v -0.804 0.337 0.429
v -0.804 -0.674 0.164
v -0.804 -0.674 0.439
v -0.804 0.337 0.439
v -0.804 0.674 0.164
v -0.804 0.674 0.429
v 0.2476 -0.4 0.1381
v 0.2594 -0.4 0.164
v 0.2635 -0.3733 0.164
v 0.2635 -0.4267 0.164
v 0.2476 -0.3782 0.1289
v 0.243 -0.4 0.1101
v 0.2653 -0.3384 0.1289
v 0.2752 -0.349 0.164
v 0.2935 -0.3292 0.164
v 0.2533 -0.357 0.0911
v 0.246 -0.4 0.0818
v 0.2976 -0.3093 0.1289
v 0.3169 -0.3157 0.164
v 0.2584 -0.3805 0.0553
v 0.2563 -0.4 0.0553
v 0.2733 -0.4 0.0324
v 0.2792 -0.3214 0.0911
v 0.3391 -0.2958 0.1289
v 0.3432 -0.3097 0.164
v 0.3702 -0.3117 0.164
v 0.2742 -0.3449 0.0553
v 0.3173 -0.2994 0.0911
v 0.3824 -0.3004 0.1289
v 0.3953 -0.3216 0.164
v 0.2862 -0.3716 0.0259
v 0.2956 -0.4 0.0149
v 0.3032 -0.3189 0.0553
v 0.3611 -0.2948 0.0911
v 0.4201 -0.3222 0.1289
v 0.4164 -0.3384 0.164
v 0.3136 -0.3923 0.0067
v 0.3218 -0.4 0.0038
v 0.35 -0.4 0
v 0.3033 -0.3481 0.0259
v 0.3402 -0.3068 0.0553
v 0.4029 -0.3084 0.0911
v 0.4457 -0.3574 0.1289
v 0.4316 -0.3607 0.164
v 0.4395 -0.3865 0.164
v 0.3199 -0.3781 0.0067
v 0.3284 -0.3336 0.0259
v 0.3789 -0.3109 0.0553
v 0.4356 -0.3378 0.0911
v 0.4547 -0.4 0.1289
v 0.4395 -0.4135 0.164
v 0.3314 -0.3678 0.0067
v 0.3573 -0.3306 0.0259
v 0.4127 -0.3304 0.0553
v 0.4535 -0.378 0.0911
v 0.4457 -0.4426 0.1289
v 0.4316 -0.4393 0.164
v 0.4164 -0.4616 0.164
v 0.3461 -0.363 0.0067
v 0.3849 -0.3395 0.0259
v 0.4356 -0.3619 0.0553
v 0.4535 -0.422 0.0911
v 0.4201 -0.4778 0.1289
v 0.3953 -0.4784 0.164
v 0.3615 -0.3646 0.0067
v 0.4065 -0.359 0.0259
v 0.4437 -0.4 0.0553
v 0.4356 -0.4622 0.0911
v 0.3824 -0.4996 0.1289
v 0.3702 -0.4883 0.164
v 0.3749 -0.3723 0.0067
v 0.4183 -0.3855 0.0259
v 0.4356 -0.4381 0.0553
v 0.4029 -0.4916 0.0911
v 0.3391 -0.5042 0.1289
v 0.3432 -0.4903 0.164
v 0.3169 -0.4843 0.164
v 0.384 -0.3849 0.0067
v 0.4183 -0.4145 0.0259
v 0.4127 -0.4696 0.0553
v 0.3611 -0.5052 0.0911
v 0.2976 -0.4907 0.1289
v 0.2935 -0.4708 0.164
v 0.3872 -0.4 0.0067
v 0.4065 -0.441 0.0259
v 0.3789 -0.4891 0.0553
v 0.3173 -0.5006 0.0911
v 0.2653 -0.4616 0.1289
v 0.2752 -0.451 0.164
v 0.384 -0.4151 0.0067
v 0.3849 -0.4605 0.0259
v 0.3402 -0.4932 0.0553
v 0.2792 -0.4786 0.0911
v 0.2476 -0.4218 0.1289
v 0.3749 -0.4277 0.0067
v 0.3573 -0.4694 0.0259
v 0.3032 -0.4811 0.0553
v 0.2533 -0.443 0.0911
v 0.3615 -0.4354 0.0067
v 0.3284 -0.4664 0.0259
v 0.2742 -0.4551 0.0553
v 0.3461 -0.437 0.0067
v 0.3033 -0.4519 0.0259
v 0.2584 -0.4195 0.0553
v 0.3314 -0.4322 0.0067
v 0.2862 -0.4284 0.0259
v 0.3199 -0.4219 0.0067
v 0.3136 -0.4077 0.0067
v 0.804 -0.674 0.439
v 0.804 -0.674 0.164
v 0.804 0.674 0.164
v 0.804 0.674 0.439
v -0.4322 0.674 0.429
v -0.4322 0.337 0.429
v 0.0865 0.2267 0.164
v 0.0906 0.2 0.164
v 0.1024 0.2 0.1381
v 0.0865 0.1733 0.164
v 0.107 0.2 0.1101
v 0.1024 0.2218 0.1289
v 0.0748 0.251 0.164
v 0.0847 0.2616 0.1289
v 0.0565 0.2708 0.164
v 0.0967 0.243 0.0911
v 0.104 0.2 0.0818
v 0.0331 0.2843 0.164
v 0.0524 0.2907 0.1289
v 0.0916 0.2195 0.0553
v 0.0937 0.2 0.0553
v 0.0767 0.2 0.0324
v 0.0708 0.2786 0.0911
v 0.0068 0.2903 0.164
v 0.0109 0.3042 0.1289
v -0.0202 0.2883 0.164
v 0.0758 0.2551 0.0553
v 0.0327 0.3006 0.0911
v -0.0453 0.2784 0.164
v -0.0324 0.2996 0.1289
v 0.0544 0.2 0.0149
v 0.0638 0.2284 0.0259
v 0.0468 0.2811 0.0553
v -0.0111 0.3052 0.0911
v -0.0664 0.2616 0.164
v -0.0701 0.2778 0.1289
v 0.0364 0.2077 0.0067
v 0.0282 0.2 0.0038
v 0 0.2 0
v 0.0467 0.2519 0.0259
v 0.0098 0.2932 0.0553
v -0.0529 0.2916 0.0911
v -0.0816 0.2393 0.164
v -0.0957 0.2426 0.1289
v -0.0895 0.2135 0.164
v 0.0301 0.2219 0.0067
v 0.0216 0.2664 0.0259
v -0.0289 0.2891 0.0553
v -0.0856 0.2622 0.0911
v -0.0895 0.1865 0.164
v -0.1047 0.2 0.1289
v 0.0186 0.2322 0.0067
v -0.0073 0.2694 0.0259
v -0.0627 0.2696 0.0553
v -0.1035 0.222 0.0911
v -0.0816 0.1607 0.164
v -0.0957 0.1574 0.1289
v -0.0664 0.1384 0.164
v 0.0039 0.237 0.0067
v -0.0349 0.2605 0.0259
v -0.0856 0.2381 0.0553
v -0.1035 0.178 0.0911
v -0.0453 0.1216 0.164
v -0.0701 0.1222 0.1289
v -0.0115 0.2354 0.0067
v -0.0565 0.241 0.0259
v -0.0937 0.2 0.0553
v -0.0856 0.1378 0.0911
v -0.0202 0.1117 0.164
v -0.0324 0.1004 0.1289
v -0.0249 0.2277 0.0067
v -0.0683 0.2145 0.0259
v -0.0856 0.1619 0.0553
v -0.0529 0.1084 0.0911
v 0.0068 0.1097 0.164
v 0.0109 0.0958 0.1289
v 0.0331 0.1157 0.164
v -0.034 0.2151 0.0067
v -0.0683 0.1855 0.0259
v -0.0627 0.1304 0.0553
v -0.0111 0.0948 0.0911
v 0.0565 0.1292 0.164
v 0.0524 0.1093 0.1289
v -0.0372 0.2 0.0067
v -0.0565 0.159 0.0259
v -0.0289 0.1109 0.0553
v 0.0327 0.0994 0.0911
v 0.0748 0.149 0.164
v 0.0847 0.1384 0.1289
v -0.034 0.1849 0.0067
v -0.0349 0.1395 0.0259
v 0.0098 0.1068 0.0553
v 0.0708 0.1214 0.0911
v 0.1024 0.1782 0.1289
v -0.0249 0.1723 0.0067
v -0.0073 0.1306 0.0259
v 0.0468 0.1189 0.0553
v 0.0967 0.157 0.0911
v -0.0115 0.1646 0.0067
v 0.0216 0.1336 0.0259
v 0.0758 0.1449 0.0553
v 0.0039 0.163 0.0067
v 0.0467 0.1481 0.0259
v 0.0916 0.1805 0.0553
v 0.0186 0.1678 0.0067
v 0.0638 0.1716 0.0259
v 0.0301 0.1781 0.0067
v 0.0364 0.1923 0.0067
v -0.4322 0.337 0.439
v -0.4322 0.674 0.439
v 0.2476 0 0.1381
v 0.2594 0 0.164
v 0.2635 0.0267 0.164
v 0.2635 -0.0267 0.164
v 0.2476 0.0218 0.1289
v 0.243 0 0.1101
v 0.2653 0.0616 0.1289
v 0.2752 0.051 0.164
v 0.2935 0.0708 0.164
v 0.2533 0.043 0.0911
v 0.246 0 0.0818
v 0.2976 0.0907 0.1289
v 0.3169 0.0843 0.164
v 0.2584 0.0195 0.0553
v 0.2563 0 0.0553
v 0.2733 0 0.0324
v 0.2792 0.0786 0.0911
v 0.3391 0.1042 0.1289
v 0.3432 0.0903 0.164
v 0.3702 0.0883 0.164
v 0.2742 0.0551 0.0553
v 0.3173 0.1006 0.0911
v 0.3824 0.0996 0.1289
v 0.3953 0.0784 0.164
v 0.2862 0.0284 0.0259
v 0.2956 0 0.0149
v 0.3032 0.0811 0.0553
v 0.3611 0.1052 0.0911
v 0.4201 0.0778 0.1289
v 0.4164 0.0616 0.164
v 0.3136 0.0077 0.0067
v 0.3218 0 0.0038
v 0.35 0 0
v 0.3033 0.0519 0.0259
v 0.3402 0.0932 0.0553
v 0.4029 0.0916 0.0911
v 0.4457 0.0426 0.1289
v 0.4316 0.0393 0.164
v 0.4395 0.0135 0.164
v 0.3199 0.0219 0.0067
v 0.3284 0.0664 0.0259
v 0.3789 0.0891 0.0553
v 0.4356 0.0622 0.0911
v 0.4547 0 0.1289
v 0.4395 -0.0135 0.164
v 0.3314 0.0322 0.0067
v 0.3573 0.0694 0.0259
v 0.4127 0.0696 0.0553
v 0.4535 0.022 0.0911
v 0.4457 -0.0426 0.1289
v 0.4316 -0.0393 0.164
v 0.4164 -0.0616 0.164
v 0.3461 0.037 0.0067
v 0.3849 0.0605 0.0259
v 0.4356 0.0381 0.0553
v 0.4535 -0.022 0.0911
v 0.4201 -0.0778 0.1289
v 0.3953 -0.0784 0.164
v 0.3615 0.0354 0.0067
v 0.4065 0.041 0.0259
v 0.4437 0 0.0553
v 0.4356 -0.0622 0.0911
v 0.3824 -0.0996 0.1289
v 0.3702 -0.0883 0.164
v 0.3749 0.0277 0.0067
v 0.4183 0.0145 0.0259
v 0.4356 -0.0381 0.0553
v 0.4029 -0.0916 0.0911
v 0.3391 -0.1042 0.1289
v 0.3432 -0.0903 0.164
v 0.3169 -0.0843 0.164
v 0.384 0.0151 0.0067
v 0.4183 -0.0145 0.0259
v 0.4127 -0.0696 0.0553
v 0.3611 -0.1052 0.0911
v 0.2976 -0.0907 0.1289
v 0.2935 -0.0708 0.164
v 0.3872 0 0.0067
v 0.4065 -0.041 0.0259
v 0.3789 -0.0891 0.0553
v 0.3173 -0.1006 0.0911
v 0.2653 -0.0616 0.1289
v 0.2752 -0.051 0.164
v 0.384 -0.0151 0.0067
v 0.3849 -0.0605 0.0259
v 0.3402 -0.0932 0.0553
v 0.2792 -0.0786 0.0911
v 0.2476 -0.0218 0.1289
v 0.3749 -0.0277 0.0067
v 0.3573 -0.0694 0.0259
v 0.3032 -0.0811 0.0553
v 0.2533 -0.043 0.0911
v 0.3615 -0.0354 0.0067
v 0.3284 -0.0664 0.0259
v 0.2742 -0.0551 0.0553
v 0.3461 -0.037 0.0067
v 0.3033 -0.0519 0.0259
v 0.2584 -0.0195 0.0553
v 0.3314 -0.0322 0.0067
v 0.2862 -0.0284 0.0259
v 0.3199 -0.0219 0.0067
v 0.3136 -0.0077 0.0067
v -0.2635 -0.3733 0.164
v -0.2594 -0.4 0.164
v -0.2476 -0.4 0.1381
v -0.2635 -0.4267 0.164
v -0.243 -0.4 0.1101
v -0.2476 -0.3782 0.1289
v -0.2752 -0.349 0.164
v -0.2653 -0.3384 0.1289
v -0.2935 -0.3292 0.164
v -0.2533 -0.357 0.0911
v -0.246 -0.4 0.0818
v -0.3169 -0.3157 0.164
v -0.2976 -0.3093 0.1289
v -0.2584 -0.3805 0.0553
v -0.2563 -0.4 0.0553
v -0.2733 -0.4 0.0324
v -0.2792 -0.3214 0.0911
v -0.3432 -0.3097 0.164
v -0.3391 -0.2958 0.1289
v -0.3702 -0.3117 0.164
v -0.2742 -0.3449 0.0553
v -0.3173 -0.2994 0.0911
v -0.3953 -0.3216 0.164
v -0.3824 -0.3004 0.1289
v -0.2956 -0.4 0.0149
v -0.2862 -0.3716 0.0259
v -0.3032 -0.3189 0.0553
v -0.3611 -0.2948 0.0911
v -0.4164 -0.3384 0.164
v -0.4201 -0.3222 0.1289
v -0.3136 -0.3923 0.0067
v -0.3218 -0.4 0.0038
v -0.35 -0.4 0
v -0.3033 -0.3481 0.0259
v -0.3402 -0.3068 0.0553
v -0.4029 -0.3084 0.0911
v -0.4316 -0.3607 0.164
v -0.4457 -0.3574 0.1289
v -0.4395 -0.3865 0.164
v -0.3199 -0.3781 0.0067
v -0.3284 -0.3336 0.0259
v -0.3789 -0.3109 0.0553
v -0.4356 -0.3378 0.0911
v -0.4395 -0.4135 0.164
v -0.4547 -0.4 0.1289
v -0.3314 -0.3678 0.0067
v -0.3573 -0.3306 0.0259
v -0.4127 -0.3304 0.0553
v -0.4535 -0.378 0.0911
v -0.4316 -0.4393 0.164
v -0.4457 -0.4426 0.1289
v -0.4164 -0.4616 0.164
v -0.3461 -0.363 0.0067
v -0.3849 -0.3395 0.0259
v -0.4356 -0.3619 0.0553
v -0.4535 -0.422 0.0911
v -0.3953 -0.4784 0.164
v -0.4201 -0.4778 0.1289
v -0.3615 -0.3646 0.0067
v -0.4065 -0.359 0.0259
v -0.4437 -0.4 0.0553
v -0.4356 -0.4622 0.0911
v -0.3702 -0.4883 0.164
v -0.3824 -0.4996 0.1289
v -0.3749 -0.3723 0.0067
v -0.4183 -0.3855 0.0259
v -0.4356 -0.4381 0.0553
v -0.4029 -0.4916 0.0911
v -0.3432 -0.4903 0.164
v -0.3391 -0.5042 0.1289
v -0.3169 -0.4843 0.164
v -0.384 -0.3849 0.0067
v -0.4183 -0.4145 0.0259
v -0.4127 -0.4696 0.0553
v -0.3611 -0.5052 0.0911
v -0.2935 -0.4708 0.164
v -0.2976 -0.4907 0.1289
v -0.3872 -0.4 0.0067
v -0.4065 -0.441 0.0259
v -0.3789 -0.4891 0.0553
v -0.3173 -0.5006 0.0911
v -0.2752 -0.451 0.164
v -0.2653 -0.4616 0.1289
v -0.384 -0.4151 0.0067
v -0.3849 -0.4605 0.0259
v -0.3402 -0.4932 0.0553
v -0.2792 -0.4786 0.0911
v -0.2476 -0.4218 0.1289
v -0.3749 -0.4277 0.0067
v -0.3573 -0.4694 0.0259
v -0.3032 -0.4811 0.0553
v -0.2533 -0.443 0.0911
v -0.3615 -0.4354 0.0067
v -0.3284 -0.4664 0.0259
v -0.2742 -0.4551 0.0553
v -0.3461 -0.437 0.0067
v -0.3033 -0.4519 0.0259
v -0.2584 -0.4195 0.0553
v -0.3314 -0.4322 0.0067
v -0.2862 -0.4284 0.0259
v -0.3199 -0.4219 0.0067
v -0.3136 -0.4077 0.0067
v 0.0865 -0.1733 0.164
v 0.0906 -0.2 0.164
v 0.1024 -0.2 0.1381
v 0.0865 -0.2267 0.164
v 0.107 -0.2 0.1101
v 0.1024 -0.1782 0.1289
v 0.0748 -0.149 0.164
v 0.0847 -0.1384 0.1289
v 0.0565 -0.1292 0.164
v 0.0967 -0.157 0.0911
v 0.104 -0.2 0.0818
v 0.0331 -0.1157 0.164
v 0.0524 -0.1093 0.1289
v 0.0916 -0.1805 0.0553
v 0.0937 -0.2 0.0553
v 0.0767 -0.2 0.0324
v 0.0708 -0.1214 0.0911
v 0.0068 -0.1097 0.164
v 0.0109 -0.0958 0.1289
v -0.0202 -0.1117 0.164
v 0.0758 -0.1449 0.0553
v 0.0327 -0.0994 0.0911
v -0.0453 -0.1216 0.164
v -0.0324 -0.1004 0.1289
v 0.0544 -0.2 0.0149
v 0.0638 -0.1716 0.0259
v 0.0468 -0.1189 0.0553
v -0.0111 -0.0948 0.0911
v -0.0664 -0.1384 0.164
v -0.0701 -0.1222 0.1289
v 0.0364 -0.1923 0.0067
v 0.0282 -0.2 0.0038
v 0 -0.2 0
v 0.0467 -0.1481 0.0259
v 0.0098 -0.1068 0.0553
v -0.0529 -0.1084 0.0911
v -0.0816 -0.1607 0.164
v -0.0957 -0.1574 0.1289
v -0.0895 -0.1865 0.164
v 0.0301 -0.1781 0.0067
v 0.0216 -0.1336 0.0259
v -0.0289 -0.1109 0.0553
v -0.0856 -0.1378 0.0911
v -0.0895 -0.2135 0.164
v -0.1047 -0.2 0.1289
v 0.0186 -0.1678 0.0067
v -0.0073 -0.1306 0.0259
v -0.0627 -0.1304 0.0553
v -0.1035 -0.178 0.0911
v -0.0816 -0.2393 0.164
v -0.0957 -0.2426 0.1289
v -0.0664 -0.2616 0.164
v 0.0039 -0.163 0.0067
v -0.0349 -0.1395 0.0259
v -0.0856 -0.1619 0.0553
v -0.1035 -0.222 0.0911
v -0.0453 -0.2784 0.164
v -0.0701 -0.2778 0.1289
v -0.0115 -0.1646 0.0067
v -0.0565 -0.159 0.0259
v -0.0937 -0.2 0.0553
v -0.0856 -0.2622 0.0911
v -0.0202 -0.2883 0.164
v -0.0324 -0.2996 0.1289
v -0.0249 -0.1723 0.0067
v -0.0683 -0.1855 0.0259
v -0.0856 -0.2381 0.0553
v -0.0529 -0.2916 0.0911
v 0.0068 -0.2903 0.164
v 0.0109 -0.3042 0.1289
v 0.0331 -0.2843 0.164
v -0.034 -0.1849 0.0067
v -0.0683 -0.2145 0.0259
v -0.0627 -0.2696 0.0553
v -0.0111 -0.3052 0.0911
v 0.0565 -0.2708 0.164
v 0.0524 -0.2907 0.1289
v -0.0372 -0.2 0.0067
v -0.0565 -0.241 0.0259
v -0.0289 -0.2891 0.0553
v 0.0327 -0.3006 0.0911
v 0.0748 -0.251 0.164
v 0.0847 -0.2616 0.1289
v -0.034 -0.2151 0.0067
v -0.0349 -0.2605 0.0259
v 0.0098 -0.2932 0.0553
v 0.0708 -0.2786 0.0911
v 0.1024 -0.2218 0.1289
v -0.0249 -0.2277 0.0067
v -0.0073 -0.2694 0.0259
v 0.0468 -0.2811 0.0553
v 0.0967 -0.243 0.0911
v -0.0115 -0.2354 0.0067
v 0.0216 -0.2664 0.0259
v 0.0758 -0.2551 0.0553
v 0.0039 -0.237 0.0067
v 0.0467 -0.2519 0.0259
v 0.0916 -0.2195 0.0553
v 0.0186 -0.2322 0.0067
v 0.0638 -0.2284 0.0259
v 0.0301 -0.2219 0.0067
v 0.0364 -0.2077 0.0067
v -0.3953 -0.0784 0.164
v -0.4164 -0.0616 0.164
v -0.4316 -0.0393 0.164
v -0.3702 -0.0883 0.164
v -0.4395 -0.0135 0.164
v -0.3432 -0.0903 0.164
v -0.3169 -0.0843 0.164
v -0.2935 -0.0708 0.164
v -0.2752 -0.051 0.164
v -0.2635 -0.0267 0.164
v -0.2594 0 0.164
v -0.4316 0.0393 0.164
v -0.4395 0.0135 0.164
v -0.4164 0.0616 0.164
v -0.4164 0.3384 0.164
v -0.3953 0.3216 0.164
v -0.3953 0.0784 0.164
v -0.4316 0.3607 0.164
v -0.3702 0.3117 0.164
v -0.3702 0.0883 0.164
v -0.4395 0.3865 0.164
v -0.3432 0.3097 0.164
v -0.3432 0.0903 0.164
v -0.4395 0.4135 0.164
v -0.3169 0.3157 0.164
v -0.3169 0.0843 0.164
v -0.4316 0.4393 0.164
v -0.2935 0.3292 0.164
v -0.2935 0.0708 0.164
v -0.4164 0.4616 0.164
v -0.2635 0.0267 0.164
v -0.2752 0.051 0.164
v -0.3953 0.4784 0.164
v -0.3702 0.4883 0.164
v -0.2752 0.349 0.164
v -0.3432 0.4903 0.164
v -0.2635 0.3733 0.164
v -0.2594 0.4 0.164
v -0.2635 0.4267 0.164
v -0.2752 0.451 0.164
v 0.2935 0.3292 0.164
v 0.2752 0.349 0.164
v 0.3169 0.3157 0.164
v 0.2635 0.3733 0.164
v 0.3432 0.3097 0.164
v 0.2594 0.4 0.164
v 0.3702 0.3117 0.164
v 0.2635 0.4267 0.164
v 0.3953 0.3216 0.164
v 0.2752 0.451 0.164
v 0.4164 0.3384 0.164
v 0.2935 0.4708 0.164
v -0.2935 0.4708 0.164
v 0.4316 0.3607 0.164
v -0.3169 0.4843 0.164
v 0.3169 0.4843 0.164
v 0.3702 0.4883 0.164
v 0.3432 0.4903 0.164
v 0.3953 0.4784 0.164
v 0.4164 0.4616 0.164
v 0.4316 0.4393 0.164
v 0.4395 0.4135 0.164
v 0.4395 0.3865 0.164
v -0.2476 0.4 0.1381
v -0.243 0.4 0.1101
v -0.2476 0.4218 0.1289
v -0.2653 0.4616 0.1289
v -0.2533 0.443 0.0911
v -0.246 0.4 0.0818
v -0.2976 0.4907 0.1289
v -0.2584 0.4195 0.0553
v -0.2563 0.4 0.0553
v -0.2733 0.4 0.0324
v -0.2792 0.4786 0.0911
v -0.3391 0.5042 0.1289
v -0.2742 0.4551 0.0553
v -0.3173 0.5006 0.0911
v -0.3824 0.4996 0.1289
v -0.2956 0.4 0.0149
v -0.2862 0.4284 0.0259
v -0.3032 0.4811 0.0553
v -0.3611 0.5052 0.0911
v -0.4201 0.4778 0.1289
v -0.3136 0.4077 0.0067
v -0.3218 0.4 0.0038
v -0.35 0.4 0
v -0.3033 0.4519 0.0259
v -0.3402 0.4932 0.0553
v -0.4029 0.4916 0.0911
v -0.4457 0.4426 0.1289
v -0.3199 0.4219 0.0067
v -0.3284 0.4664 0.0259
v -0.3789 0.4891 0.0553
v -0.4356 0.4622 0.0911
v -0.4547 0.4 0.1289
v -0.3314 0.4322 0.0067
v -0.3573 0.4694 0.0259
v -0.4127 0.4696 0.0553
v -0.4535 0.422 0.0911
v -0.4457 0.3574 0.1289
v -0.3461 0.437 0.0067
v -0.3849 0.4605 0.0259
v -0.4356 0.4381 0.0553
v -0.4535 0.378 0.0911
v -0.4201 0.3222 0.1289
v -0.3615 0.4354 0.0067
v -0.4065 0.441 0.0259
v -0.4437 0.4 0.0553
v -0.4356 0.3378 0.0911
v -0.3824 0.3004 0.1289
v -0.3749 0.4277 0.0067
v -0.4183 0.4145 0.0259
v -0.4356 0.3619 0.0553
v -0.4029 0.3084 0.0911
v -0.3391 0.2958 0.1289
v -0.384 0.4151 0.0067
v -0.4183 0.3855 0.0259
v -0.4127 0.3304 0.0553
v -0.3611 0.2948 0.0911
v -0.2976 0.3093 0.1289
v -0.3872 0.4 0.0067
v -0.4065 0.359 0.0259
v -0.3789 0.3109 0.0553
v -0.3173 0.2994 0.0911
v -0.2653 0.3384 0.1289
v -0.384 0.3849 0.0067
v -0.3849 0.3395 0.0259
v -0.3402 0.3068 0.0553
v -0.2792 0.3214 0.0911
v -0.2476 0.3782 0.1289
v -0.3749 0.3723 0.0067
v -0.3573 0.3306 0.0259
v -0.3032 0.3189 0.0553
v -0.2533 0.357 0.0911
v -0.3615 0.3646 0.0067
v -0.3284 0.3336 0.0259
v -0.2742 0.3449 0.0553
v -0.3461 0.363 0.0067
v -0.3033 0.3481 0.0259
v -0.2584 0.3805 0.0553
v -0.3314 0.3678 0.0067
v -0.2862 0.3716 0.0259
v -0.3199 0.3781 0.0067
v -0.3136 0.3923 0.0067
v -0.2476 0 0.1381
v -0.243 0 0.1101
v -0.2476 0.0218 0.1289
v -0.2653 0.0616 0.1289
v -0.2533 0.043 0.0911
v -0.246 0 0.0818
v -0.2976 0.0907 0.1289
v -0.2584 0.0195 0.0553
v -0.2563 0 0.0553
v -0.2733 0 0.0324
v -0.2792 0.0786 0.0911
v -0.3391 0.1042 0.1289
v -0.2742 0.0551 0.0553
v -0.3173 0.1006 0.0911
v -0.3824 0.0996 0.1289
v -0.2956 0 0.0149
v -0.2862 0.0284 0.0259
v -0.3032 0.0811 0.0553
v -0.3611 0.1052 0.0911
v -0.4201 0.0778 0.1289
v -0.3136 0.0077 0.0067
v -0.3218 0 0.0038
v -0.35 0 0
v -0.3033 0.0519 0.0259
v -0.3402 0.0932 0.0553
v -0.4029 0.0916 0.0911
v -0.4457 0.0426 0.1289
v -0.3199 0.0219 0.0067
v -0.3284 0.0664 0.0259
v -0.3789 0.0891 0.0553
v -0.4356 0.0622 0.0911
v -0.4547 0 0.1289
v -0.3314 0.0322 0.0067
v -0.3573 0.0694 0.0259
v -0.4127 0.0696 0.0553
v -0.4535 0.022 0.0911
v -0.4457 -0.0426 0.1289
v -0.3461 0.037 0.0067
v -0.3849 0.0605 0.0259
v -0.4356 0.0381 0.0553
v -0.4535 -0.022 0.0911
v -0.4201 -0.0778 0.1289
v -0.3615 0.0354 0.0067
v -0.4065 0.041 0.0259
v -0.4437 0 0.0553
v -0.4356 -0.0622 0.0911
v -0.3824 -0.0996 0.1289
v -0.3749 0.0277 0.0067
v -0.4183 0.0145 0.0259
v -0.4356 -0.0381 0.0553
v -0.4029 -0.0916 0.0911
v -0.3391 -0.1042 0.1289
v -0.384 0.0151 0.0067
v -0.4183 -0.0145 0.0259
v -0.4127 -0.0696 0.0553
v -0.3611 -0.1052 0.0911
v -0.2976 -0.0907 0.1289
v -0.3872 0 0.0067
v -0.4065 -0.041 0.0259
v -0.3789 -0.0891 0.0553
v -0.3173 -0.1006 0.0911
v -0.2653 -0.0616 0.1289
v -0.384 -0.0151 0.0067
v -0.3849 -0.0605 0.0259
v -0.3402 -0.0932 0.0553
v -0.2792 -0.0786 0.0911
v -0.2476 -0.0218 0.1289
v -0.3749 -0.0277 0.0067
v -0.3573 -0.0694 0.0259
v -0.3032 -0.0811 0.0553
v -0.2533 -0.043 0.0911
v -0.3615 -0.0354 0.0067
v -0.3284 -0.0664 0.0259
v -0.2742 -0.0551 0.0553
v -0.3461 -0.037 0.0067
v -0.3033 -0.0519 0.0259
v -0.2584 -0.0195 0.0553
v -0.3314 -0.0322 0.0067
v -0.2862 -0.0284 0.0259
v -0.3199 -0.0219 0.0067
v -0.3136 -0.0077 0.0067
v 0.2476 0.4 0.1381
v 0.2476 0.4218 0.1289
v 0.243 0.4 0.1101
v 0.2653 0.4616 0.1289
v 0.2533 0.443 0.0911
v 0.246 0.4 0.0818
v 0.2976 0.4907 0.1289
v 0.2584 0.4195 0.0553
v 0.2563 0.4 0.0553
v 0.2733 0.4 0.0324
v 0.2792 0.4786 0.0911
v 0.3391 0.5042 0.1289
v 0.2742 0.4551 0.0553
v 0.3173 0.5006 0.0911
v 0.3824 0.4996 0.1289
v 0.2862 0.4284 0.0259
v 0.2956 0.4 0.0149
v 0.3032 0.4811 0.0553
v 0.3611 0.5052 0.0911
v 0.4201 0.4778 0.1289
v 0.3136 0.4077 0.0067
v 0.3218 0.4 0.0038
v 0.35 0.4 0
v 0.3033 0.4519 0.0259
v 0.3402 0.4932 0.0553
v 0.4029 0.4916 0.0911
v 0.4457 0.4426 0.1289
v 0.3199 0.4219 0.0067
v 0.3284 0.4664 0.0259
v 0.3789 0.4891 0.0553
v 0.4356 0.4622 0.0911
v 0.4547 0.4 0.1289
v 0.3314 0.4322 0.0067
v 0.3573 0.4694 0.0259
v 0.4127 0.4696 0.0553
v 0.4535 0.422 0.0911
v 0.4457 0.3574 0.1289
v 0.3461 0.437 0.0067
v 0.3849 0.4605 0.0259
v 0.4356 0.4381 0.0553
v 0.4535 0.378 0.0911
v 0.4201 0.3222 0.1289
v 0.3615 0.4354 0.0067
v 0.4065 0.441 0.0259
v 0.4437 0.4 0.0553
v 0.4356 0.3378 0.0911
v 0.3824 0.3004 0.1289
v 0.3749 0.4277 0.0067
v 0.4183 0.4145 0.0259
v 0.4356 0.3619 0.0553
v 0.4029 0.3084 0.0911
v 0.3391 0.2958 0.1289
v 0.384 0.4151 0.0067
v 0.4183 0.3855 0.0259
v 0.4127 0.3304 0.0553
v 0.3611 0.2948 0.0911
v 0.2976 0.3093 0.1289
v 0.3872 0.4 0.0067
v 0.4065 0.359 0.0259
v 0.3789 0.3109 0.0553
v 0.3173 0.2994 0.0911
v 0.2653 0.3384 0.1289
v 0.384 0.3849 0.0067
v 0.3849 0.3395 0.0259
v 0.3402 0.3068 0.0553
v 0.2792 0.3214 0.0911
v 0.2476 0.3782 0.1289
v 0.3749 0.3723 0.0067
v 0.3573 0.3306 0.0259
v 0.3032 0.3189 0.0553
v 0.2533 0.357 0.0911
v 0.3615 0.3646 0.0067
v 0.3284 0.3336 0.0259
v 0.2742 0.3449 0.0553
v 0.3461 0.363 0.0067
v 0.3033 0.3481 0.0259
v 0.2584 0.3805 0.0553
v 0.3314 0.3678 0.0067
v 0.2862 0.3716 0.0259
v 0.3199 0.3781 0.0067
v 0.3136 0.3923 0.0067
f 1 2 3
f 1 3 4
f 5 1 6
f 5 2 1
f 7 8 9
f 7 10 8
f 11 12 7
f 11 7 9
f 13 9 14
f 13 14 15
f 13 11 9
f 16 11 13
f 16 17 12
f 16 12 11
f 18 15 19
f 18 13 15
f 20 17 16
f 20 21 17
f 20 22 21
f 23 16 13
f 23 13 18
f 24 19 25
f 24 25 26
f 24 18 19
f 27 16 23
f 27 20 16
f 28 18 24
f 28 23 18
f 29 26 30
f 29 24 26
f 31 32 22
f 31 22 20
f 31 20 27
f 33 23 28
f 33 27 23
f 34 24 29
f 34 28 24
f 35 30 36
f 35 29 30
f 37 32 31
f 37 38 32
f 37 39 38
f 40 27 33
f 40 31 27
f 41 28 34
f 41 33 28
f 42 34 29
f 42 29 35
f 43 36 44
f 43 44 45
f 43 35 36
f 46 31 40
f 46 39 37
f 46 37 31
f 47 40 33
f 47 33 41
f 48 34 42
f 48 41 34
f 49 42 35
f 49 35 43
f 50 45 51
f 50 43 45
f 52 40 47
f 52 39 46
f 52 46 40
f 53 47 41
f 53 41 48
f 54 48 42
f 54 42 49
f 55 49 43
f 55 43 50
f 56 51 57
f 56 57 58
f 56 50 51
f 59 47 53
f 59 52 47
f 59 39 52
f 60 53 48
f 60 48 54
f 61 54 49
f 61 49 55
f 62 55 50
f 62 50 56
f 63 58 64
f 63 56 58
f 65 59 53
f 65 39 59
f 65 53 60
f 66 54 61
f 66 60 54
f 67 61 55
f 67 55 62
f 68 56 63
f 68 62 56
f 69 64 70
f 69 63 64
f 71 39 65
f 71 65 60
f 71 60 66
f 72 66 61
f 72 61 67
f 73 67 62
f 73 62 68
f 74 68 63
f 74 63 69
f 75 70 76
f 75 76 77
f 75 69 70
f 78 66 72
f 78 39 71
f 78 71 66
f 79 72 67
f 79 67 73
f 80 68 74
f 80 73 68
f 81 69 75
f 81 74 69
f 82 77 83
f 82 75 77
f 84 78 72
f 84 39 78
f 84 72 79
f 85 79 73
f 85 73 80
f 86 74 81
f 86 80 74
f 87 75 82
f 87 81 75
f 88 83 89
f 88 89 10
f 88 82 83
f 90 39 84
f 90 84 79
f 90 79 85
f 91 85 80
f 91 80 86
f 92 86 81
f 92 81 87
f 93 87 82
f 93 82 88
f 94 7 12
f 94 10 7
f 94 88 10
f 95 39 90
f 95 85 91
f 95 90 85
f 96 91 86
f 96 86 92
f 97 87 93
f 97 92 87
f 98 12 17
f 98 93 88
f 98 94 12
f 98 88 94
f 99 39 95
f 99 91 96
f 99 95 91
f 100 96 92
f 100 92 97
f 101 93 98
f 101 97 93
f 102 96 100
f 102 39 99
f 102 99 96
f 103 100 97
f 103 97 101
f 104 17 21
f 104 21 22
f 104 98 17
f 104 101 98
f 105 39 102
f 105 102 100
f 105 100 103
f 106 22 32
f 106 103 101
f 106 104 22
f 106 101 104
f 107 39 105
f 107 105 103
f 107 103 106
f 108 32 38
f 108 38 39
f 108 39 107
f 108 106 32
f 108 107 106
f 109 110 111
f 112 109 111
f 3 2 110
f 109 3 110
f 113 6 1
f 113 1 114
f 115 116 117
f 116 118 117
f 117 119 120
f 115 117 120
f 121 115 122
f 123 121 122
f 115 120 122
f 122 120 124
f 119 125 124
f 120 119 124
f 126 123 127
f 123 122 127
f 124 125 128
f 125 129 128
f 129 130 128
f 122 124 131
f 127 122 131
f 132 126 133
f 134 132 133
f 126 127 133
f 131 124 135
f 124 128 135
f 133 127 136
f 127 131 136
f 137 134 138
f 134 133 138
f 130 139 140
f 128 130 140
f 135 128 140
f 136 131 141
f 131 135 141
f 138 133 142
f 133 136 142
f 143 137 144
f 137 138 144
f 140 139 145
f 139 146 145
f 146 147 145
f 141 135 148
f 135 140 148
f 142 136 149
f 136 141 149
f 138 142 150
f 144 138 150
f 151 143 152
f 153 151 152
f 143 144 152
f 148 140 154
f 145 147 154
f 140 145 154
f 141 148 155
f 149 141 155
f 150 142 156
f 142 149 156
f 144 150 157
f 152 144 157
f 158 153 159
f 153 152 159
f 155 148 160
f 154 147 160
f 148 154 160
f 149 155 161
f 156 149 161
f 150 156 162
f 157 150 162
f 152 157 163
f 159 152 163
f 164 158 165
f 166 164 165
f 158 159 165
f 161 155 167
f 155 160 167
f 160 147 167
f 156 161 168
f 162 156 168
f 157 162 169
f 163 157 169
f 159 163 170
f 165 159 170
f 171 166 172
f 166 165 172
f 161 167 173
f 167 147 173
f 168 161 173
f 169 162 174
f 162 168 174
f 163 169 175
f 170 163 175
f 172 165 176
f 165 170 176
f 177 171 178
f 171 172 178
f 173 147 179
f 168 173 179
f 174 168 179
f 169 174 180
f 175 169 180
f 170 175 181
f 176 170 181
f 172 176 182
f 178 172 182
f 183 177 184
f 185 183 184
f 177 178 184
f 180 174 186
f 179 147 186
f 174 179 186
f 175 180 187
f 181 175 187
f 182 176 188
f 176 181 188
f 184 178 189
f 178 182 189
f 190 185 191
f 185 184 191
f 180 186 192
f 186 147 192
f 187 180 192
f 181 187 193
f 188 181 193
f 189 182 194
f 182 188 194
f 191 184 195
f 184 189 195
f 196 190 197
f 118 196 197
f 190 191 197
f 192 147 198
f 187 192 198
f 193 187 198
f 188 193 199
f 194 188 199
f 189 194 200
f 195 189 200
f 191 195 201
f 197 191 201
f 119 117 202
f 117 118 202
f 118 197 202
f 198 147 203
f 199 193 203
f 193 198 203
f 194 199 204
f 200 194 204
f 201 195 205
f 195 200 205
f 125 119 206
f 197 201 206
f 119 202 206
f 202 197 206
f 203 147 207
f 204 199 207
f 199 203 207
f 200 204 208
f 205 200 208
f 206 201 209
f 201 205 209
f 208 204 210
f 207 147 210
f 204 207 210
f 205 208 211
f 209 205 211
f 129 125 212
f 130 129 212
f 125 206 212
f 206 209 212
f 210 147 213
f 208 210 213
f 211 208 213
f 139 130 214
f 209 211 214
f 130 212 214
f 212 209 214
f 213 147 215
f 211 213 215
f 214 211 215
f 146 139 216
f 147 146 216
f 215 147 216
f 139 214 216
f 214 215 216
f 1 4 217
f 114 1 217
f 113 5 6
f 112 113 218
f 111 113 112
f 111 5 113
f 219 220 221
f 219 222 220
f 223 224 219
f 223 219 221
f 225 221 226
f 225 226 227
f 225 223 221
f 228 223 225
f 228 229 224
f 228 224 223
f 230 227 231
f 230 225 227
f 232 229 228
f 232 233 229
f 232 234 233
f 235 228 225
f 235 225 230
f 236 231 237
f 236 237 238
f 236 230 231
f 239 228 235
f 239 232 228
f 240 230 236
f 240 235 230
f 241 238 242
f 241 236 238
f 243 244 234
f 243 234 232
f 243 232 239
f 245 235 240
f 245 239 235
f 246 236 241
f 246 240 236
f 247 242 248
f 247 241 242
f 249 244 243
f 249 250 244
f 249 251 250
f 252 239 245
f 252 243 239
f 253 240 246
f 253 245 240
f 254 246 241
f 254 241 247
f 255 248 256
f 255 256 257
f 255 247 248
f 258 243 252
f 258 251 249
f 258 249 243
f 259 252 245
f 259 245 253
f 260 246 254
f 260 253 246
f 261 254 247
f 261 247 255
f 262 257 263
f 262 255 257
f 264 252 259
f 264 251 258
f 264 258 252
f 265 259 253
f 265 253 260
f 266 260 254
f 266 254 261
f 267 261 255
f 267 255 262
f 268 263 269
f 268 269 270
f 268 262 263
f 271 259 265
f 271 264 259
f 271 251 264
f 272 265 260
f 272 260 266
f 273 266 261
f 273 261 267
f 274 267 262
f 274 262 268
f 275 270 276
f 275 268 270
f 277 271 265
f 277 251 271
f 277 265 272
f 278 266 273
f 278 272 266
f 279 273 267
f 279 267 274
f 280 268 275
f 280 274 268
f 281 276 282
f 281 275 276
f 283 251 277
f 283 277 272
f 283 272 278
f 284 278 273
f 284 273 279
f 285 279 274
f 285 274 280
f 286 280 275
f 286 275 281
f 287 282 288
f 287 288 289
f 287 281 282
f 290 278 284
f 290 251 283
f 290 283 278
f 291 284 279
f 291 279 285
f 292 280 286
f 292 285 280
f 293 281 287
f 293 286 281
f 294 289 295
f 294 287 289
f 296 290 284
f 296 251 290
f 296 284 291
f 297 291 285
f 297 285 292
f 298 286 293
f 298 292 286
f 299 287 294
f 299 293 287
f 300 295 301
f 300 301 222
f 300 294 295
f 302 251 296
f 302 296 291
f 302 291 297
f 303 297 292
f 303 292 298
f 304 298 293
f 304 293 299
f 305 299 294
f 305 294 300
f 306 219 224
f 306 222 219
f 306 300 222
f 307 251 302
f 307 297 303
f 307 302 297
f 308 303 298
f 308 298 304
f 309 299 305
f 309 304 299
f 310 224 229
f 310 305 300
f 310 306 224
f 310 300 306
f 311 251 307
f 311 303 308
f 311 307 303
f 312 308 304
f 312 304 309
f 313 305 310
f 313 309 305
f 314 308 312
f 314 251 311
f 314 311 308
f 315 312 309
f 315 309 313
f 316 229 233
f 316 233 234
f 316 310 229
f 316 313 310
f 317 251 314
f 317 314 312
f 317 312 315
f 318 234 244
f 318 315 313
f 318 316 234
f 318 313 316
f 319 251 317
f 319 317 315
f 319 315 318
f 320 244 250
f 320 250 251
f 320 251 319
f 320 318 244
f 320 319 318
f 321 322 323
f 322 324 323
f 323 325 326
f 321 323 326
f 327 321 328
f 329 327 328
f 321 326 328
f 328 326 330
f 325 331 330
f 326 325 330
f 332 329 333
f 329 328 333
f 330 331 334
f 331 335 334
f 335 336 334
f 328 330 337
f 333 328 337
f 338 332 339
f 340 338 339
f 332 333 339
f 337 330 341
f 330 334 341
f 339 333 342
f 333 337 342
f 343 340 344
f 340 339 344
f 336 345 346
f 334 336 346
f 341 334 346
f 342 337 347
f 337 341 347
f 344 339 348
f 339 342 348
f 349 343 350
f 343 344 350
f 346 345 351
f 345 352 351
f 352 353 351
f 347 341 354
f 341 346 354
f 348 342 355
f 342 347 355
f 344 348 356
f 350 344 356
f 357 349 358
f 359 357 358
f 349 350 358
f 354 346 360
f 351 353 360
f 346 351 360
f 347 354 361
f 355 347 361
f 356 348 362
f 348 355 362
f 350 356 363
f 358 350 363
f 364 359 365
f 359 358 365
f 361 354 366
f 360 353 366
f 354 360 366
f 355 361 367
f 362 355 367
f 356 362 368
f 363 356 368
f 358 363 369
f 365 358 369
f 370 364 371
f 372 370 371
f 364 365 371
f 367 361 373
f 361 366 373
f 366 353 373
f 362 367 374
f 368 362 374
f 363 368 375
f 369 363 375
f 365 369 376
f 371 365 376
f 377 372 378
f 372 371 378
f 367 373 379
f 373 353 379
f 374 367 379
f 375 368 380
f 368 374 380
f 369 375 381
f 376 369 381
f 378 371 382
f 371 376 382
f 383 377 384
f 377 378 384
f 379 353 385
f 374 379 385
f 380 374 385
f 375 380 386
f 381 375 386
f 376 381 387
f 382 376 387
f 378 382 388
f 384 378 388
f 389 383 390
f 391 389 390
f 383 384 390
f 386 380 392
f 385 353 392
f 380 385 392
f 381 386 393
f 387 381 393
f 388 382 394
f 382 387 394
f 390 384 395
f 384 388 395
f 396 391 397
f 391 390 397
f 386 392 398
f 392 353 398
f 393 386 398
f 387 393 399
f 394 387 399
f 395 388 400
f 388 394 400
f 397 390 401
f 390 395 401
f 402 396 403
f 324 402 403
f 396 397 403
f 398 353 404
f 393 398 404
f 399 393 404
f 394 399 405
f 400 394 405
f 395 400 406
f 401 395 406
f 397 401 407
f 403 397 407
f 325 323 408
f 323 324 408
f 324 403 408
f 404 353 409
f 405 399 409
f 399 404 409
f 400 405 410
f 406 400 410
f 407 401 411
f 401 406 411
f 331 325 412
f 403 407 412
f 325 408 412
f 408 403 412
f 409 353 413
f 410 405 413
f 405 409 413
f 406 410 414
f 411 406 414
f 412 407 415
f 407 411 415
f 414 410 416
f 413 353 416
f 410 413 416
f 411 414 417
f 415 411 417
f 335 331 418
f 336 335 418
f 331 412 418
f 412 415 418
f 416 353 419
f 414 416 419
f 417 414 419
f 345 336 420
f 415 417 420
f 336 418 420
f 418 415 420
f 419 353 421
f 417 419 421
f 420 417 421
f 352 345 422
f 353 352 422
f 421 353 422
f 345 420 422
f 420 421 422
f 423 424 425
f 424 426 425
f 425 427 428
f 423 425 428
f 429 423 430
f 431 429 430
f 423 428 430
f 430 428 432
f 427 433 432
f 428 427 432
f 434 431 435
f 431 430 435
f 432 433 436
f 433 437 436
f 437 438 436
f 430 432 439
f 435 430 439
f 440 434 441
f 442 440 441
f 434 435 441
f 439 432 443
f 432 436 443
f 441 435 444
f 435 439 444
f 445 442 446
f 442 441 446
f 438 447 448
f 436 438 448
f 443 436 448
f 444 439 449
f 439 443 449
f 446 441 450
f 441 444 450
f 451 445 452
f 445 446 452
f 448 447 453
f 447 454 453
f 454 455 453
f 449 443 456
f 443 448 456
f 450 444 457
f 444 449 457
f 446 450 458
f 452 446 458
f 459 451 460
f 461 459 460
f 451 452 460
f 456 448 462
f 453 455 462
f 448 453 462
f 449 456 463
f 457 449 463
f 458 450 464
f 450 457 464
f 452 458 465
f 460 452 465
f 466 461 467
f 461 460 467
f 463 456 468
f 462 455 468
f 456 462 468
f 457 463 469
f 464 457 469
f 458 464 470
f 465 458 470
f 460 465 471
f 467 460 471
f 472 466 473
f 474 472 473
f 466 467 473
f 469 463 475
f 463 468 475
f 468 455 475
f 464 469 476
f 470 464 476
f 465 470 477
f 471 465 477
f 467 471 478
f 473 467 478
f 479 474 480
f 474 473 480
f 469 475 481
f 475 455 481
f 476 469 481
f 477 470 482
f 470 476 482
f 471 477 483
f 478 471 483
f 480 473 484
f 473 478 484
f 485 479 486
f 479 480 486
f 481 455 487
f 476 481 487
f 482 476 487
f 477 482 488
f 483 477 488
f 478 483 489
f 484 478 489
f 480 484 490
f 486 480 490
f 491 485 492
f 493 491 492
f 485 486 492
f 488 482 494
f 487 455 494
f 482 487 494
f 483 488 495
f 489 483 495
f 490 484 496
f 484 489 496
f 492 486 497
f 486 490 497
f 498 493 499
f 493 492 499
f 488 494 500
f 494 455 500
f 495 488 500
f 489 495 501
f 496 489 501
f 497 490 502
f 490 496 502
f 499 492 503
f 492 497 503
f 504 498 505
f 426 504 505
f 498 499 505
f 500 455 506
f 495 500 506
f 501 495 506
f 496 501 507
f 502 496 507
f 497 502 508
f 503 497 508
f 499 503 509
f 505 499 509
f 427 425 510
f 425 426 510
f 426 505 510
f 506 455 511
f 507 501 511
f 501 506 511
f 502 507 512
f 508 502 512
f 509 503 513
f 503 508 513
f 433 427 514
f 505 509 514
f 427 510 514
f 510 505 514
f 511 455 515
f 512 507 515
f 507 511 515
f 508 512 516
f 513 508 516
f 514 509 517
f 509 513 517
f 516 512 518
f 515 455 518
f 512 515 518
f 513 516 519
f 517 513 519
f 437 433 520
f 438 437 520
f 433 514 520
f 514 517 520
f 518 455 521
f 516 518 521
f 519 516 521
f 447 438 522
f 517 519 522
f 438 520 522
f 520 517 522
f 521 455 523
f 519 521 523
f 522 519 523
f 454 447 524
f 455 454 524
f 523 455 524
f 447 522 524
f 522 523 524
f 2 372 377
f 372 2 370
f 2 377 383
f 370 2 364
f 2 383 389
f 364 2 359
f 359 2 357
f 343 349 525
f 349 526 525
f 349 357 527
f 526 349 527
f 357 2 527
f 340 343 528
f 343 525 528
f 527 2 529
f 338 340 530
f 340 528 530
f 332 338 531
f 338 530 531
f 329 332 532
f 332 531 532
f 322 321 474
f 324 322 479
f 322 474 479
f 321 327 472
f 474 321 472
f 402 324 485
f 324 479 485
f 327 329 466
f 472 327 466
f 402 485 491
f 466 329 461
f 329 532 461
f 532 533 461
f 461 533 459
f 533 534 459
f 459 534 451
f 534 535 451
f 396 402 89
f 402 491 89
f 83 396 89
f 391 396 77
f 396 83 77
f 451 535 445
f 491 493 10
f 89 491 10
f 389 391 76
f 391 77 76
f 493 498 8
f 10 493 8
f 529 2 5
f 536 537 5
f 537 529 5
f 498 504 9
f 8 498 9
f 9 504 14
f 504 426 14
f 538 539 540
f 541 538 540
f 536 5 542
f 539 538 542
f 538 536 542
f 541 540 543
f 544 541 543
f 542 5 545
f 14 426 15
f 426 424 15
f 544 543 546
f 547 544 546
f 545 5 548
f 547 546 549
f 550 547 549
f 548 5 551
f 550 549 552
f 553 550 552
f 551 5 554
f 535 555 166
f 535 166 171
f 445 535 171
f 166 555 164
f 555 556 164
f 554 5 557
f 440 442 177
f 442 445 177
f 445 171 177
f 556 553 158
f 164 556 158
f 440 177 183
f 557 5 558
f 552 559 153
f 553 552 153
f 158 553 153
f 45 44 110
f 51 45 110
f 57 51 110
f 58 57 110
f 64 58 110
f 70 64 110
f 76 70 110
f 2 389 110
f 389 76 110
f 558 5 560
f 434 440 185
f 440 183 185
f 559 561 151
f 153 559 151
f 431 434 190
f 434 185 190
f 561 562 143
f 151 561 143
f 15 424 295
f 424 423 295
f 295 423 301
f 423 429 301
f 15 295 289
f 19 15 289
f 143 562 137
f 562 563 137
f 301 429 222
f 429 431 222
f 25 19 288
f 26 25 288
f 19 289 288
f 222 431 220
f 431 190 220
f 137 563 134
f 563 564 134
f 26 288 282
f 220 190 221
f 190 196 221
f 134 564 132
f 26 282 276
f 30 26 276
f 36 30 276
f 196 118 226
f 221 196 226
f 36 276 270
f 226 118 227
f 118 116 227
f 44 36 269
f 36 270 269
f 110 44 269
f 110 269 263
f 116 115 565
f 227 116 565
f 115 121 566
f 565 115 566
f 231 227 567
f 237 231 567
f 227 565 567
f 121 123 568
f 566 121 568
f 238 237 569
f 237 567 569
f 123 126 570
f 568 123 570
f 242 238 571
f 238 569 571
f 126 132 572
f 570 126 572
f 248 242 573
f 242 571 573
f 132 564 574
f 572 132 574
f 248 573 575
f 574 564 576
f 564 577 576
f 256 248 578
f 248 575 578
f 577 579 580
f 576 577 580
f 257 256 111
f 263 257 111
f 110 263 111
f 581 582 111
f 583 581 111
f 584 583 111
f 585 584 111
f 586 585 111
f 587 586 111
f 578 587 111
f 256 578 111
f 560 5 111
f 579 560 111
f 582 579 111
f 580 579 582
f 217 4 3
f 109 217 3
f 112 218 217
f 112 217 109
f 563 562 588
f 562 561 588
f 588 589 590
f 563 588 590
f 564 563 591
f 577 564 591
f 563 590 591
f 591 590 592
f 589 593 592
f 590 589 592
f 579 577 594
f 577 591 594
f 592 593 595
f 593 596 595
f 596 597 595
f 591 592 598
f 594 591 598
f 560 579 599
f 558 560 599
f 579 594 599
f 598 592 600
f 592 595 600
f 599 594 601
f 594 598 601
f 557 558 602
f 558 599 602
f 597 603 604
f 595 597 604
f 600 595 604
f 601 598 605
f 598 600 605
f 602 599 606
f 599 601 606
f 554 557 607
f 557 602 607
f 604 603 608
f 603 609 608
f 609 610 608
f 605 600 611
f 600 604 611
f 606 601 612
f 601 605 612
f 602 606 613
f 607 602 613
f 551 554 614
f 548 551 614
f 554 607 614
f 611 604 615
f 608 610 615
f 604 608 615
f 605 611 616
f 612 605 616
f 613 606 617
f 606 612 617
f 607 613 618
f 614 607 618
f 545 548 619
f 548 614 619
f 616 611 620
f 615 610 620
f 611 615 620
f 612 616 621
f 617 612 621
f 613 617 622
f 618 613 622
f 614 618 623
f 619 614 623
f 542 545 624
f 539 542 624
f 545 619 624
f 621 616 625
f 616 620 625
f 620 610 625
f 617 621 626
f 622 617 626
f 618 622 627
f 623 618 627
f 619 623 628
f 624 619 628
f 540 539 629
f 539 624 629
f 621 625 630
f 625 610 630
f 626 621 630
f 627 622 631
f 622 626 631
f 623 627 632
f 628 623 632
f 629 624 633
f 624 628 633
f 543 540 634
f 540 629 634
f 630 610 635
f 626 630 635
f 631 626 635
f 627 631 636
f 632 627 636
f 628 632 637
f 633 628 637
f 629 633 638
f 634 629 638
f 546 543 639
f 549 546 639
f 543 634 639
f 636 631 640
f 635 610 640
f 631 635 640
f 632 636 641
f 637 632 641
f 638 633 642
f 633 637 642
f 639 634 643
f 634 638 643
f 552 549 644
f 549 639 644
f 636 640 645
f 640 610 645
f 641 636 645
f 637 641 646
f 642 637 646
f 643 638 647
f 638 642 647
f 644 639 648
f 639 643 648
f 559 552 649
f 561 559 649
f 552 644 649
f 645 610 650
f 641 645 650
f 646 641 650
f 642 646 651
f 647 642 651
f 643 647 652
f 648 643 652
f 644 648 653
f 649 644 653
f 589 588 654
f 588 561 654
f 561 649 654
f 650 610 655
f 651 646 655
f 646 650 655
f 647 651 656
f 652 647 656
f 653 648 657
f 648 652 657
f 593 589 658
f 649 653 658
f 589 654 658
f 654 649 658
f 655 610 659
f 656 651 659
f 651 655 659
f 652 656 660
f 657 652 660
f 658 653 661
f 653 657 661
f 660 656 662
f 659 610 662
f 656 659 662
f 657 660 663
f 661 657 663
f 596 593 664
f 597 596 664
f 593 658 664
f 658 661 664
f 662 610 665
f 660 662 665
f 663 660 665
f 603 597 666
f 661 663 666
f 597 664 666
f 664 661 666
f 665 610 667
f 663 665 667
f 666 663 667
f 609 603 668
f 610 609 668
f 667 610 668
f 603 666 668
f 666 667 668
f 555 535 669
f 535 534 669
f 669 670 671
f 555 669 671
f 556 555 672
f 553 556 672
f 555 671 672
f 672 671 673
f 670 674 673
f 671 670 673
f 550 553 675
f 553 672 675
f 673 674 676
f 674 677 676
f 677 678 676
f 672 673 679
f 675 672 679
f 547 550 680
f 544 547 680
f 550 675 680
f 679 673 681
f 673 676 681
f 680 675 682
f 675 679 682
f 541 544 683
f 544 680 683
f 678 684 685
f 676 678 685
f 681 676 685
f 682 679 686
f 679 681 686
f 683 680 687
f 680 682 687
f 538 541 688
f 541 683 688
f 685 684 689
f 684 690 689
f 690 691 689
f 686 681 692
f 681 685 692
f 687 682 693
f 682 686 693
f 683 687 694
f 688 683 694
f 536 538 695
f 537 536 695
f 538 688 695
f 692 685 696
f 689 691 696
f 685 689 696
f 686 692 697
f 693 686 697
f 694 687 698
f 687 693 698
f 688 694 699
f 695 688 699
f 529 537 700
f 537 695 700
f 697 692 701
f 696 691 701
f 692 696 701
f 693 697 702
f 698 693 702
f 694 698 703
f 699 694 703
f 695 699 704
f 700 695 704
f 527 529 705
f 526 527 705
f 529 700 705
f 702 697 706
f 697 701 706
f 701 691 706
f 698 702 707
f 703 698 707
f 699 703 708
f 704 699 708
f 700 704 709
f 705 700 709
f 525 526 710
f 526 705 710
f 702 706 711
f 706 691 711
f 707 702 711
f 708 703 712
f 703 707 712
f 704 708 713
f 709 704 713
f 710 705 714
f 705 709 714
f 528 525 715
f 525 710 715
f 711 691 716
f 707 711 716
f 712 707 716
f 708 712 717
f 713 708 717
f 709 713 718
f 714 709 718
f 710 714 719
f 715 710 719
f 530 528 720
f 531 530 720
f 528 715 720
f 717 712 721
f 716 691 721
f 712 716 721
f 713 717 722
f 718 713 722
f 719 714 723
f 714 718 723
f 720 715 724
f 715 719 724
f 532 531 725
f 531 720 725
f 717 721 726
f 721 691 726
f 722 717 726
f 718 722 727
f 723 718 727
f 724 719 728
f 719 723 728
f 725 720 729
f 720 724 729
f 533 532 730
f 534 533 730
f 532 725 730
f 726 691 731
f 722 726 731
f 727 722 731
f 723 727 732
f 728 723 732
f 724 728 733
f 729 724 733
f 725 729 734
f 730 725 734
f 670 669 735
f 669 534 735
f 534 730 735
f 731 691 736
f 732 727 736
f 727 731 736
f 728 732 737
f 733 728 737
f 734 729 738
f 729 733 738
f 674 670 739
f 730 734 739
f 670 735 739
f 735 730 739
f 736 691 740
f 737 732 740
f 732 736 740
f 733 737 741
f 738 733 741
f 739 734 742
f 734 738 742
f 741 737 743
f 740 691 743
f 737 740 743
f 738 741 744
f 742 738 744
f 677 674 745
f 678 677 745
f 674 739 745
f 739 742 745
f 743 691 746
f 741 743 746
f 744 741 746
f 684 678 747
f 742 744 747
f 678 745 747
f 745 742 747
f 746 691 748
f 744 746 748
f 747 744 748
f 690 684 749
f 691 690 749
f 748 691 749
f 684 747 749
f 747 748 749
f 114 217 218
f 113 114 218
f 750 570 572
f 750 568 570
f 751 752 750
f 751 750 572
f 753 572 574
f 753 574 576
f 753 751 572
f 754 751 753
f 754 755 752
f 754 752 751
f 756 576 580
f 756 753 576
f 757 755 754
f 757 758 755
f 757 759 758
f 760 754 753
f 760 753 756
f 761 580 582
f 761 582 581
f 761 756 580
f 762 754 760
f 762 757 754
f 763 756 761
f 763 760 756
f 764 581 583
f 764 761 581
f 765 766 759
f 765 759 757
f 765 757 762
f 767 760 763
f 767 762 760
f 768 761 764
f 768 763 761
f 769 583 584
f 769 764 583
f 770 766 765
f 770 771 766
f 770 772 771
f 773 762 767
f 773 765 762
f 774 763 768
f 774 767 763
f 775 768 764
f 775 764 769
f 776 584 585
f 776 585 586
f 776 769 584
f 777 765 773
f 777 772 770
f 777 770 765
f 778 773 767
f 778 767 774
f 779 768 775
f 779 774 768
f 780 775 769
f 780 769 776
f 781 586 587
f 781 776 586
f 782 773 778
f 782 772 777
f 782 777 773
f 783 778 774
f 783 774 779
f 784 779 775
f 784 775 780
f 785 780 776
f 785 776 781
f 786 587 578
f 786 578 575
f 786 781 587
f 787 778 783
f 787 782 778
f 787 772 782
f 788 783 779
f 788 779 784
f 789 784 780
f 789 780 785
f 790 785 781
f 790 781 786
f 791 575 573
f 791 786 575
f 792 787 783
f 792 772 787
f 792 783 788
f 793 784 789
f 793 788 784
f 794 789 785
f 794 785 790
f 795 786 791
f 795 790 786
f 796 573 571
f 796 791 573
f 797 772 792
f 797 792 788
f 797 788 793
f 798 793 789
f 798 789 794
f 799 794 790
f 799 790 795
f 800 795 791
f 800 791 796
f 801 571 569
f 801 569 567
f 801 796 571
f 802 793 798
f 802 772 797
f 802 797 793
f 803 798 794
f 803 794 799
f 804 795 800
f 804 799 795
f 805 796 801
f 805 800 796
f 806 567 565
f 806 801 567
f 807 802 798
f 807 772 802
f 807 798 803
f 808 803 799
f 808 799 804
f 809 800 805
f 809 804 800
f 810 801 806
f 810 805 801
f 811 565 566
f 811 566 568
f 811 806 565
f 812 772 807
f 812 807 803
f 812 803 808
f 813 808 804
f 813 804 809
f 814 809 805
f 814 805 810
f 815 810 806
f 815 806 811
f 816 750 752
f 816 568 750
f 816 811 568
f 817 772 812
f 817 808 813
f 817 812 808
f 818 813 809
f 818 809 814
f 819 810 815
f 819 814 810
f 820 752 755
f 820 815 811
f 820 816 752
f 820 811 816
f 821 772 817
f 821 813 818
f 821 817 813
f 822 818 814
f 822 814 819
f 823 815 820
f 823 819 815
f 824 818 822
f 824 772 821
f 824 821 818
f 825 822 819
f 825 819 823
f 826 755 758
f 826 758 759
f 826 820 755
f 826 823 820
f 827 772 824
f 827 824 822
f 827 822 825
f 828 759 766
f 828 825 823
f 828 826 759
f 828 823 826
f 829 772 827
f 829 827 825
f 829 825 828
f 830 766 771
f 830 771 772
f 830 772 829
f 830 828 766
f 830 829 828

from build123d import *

# Parameters (mm, degrees)
BOSS_EXTRUDE1_START = 0.164
SKETCH1_W           = 1.608
SKETCH1_H           = 1.348
BOSS_EXTRUDE1_DEPTH = 0.275
SKETCH2_W           = 0.371806895
SKETCH2_H           = 0.337035884
CUT_EXTRUDE1_DEPTH  = 0.01
LPATTERN1_COUNT     = 2
LPATTERN1_PITCH     = 0.4
LPATTERN1_COL_COUNT = 2
LPATTERN1_COL_PITCH = 0.4


with BuildPart() as part:
    # Sketch1 → Boss-Extrude1 (new body)
    with BuildSketch(Plane.XY.offset(BOSS_EXTRUDE1_START)):
        Rectangle(SKETCH1_W, SKETCH1_H)
    extrude(amount=BOSS_EXTRUDE1_DEPTH)

    # Sketch2 → Cut-Extrude1 (cut)
    with BuildSketch(Plane.XY.offset(0.439)):
        with Locations((-0.618096553, 0.505482058)):
            Rectangle(SKETCH2_W, SKETCH2_H)
    extrude(amount=-CUT_EXTRUDE1_DEPTH, mode=Mode.SUBTRACT)

    # Sketch3 → Revolve5 (revolve)
    with BuildSketch(Plane(origin=(0, 0, 0), x_dir=(1, 0, 0), z_dir=(0, 1, 0))):
        with BuildLine():
            Line((-0.35, 0), (-0.35, -0.164))
            Line((-0.35, -0.164), (-0.259446149, -0.164))
            ThreePointArc((-0.259446149, -0.164), (-0.256330368, -0.055279598), (-0.35, 0))
        make_face()
    revolve5 = revolve(axis=Axis((-0.35, 0, 0), (0, 0, 1)))

    # LPattern1: Revolve5 ×2
    with Locations(*[(0, i * LPATTERN1_PITCH, 0) for i in range(1, LPATTERN1_COUNT)]):
        add(revolve5)

    # LPattern1 col: Revolve5 ×2
    with Locations(*[(0, -i * LPATTERN1_COL_PITCH, 0) for i in range(1, LPATTERN1_COL_COUNT)]):
        add(revolve5)

    # Sketch-Pattern1: Revolve5 at 2 more places
    with Locations((0.35, 0.2, 0), (0.35, -0.2, 0)):
        add(revolve5)

    # Mirror1: Revolve5 across plane
    add(revolve5.mirror(Plane(origin=(0, 0, 0), x_dir=(0, 0, 1), z_dir=(1, 0, 0))))

    # Mirror1 copy 1 sketch → Mirror1 copy 1 (revolve)
    with BuildSketch(Plane(origin=(0, 0.4, 0), x_dir=(-1, 0, 0), z_dir=(0, 1, 0))):
        with BuildLine():
            Line((-0.35, 0), (-0.35, 0.164))
            Line((-0.35, 0.164), (-0.259446149, 0.164))
            ThreePointArc((-0.259446149, 0.164), (-0.256330368, 0.055279598), (-0.35, 0))
        make_face()
    revolve(axis=Axis((0.35, 0.4, 0), (0, 0, -1)))

    # Mirror1 copy 2 sketch → Mirror1 copy 2 (revolve)
    with BuildSketch(Plane(origin=(0, -0.4, 0), x_dir=(-1, 0, 0), z_dir=(0, 1, 0))):
        with BuildLine():
            Line((-0.35, 0), (-0.35, 0.164))
            Line((-0.35, 0.164), (-0.259446149, 0.164))
            ThreePointArc((-0.259446149, 0.164), (-0.256330368, 0.055279598), (-0.35, 0))
        make_face()
    revolve(axis=Axis((0.35, -0.4, 0), (0, 0, -1)))


solid = part.part
